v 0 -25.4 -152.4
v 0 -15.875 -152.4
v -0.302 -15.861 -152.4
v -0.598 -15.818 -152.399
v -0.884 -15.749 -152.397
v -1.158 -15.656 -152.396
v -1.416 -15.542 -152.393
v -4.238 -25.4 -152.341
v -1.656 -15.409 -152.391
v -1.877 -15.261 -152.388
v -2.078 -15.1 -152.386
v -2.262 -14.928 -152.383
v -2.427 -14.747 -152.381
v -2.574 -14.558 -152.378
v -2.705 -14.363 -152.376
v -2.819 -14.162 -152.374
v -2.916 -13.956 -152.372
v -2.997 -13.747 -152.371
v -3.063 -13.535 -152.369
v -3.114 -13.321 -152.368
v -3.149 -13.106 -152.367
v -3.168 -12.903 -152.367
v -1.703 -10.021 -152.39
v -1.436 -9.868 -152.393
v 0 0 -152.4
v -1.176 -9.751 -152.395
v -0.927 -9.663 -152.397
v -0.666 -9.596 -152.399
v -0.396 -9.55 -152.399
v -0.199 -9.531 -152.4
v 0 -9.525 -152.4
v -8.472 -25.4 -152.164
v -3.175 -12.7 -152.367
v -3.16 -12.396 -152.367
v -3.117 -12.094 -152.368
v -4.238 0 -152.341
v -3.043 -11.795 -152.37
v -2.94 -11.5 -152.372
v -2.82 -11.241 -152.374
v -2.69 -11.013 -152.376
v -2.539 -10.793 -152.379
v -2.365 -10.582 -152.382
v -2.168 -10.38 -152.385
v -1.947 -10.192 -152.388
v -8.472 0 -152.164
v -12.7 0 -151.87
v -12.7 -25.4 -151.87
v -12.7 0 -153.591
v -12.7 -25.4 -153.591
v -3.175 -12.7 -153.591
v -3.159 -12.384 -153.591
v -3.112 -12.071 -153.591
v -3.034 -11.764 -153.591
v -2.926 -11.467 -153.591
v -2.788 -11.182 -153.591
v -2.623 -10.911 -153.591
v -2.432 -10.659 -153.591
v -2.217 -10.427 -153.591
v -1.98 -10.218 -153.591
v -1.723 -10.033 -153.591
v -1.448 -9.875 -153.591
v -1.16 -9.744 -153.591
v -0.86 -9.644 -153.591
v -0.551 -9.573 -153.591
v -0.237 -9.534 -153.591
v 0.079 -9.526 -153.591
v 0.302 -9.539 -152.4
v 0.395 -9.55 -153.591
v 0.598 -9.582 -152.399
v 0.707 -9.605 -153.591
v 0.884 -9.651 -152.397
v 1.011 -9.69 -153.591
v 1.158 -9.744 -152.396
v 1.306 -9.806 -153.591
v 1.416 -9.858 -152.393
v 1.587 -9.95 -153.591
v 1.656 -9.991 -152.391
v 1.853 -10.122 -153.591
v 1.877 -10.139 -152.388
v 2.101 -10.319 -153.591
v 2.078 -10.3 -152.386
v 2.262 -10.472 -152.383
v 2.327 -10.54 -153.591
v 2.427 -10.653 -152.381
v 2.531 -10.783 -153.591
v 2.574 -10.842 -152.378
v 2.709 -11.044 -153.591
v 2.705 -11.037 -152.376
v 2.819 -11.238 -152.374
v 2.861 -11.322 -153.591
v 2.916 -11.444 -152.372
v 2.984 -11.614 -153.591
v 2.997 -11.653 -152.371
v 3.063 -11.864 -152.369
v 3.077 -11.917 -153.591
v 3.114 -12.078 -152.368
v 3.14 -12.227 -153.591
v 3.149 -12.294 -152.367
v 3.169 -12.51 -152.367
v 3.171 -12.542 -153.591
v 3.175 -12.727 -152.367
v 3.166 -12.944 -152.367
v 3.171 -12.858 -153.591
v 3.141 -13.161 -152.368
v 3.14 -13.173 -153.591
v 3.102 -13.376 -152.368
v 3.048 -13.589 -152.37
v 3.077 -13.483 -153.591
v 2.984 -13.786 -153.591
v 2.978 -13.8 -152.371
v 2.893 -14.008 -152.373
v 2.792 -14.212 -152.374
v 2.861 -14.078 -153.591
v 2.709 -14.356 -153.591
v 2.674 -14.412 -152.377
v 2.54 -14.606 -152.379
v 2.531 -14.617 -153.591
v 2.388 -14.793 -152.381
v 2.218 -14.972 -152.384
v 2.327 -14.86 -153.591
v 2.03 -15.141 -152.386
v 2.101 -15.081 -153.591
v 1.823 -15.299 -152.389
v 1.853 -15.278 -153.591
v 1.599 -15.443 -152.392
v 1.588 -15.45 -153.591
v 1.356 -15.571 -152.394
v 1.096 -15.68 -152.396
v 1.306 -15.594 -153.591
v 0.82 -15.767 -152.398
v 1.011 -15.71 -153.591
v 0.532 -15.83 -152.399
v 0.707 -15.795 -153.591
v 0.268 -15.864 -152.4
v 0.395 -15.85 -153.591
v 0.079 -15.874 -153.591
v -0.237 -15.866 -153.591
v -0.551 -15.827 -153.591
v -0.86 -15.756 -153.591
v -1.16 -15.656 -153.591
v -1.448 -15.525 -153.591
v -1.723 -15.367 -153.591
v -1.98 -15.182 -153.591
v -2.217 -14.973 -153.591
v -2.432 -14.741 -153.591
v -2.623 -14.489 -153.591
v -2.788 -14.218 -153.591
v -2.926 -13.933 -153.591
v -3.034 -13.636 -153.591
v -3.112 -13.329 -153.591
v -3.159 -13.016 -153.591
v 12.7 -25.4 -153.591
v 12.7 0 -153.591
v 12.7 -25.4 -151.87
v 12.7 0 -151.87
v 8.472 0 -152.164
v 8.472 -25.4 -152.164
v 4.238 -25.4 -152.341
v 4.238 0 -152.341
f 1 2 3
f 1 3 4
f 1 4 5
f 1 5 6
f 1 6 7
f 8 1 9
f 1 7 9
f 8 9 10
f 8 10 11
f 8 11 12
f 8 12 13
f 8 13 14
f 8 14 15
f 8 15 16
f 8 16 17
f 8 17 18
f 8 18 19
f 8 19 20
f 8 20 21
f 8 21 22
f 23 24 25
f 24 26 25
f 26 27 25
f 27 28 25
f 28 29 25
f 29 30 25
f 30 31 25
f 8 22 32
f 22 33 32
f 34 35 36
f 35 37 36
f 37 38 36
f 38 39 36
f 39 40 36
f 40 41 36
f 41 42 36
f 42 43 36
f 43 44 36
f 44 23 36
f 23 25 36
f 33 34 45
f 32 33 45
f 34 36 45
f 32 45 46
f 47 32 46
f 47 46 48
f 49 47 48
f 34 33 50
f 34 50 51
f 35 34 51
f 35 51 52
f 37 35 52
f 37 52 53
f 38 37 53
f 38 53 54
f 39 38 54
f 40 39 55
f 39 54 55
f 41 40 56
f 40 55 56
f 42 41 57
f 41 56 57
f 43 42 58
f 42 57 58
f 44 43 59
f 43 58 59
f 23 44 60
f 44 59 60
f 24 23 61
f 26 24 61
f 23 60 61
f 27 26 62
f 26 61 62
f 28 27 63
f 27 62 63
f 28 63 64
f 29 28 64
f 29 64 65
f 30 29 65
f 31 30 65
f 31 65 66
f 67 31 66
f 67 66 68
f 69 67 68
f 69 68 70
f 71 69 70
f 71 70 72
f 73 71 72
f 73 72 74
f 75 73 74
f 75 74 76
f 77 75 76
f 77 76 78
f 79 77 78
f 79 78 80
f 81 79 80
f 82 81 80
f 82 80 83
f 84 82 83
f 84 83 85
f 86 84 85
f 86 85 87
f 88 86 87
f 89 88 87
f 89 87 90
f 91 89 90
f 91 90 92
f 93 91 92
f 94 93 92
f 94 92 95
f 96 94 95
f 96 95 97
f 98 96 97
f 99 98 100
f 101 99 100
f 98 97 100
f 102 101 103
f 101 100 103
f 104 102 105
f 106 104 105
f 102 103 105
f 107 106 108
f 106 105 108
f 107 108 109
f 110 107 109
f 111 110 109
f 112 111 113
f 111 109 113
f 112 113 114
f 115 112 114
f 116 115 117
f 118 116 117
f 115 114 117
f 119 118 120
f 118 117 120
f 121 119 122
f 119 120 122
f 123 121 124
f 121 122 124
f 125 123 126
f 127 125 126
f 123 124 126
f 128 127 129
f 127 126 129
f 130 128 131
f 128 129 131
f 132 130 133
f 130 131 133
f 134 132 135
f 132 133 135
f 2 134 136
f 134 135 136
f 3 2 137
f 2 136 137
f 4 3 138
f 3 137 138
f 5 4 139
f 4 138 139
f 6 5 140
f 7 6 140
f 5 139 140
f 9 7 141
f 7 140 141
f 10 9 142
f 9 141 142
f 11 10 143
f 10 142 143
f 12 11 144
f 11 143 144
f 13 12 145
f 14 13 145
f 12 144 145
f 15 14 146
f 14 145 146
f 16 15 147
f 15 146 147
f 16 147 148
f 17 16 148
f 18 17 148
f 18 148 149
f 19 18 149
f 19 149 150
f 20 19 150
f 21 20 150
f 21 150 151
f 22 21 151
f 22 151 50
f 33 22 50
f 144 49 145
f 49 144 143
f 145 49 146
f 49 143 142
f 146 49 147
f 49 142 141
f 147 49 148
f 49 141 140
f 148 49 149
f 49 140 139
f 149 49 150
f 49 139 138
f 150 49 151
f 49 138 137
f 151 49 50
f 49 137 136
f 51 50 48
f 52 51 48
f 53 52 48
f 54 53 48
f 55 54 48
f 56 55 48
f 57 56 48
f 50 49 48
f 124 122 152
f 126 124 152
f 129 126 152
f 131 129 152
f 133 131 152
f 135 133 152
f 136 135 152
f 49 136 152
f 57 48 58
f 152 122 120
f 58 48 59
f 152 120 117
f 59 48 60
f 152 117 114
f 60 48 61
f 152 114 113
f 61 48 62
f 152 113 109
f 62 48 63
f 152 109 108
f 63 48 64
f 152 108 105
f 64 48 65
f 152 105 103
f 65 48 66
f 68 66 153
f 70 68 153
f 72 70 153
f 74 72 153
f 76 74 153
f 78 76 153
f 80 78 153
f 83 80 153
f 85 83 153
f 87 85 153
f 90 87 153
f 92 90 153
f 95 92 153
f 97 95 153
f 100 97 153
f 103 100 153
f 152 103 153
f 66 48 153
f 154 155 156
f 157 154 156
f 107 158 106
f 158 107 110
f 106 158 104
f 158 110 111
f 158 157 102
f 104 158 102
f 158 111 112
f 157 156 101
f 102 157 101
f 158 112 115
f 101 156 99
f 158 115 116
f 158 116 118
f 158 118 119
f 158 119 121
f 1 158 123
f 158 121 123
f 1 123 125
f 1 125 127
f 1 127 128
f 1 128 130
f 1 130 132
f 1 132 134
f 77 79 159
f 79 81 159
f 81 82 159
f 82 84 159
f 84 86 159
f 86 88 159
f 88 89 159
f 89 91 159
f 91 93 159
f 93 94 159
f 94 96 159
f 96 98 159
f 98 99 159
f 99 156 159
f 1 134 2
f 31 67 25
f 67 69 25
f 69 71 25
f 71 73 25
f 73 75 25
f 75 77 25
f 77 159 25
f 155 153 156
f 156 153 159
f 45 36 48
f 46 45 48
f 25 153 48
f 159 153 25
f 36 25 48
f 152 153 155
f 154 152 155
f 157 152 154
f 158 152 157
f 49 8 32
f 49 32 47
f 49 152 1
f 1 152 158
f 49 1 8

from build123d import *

# Parameters (mm, degrees)
BOSS_EXTRUDE1_DEPTH = 25.4
SKETCH2_R           = 3.175
CUT_EXTRUDE1_DEPTH  = 1.7209262


with BuildPart() as part:
    # Sketch1 → Boss-Extrude1 (new body)
    with BuildSketch(Plane(origin=(0, 0, 0), x_dir=(1, 0, 0), z_dir=(0, 1, 0))):
        with BuildLine():
            Line((-12.7, 151.869911437), (-12.7, 153.590837637))
            Line((-12.7, 153.590837637), (12.7, 153.590837637))
            Line((12.7, 153.590837637), (12.7, 151.869911437))
            ThreePointArc((12.7, 151.869911437), (6.355528969, 152.267420191), (0, 152.4))
            ThreePointArc((0, 152.4), (-6.355528969, 152.267420191), (-12.7, 151.869911437))
        make_face()
    extrude(amount=-BOSS_EXTRUDE1_DEPTH)

    # Sketch2 → Cut-Extrude1 (cut)
    with BuildSketch(Plane(origin=(0, 0, -153.590837637), x_dir=(-1, 0, 0), z_dir=(0, 0, -1))):
        with Locations((0, -12.7)):
            Circle(SKETCH2_R)
    extrude(amount=-CUT_EXTRUDE1_DEPTH, mode=Mode.SUBTRACT)


solid = part.part
